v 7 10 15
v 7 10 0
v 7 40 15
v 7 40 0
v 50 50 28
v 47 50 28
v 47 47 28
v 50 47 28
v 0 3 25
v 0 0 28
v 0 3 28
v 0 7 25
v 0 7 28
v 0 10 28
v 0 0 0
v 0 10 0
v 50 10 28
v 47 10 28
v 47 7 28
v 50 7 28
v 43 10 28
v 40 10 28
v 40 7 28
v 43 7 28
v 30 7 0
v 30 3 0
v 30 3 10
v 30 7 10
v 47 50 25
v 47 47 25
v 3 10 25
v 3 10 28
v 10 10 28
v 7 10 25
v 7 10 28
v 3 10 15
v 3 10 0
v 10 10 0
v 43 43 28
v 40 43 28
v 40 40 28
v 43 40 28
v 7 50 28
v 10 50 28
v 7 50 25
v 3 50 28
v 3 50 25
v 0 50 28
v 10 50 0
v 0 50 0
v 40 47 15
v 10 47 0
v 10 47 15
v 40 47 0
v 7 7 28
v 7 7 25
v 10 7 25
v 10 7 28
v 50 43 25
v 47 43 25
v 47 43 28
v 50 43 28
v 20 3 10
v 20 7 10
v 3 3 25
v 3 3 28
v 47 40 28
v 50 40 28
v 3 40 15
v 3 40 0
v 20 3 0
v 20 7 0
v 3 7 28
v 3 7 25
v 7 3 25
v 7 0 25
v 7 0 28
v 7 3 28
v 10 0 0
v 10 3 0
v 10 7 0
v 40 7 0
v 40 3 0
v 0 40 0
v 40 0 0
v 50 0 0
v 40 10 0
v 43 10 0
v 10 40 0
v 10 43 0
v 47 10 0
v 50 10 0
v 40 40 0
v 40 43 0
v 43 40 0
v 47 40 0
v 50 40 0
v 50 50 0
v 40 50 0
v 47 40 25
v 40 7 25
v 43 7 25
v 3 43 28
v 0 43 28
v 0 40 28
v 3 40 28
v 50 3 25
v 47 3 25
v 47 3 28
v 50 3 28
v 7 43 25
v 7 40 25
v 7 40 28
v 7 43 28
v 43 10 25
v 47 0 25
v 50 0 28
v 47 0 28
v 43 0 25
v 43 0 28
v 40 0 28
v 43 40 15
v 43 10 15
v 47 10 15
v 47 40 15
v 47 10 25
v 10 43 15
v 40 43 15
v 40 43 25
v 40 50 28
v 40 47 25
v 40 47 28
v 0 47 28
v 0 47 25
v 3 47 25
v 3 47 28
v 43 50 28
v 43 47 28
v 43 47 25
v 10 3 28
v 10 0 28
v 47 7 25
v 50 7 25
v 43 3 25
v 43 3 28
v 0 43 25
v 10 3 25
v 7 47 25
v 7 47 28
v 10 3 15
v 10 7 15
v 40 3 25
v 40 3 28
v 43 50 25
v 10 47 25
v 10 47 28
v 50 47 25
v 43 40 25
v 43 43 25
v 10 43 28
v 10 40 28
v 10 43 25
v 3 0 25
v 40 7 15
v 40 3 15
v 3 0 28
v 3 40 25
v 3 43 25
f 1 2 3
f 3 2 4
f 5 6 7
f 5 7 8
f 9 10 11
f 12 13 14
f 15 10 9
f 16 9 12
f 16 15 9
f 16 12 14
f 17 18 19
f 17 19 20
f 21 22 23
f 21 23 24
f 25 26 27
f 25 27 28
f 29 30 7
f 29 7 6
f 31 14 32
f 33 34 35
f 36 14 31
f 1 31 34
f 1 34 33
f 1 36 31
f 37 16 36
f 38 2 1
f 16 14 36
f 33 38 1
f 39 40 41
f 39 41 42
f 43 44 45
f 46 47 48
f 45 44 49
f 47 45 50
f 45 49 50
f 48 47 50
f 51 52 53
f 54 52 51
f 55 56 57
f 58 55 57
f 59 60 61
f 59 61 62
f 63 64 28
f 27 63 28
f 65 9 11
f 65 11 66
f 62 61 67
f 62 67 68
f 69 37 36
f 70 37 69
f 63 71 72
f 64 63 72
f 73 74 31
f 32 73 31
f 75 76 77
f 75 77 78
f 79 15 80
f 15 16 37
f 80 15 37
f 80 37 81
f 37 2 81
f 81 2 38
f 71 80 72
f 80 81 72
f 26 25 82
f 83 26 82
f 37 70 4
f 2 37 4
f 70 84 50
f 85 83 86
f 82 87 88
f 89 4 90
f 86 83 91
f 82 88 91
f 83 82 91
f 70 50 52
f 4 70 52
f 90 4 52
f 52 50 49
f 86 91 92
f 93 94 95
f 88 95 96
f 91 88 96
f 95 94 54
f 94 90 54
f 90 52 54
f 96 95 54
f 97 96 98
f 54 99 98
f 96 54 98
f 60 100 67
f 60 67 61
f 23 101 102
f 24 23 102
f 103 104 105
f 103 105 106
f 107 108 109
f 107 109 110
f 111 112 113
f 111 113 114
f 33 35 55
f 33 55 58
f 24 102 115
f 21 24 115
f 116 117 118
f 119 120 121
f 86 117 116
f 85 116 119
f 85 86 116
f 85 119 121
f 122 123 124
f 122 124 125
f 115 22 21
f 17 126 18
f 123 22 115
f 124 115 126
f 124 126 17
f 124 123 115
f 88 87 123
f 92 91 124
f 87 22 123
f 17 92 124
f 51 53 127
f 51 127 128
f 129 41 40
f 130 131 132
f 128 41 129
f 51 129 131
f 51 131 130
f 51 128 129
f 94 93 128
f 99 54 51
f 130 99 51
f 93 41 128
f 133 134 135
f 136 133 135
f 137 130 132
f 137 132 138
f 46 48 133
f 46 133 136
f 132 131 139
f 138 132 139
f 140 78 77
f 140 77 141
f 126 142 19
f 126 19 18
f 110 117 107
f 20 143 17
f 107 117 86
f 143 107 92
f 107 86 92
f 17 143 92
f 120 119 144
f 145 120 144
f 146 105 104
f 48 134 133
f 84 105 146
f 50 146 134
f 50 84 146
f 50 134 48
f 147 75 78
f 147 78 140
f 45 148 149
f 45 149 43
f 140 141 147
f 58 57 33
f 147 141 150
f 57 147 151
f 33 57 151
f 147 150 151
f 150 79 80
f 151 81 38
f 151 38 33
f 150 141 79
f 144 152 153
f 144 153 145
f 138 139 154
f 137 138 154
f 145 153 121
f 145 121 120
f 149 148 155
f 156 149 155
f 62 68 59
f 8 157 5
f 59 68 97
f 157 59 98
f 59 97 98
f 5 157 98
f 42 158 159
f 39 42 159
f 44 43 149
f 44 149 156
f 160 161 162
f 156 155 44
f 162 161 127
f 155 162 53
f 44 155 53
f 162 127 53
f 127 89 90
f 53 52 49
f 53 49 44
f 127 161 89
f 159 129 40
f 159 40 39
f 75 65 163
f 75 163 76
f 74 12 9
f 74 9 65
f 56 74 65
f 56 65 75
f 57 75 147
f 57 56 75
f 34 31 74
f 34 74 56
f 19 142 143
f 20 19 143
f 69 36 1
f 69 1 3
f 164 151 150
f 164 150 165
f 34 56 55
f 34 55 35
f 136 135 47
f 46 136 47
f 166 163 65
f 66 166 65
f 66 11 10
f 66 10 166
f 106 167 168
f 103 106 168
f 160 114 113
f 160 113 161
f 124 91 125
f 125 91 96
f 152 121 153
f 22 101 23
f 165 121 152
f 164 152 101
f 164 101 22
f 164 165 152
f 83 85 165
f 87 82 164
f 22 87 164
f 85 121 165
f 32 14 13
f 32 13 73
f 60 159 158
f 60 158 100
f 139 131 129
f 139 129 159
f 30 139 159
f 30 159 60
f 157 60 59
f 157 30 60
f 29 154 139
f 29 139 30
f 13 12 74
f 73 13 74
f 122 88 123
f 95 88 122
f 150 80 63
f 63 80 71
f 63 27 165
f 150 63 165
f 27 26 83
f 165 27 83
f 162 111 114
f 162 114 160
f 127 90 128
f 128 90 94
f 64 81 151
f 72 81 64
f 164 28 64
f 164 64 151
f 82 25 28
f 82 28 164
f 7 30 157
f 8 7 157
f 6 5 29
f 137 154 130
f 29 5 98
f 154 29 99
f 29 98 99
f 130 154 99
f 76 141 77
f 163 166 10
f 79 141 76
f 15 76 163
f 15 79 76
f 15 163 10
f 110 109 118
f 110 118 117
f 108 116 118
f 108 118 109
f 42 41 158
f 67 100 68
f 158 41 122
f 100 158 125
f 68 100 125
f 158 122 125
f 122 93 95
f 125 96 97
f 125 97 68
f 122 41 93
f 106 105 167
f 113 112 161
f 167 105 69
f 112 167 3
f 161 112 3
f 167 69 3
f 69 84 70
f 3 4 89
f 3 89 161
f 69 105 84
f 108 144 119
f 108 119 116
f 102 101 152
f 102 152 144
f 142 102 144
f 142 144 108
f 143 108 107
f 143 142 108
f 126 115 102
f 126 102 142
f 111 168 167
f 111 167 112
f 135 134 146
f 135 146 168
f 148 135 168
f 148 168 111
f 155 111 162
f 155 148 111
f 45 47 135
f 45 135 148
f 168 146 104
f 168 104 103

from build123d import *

# Parameters (mm, degrees)
BOX002_W     = 3
BOX002_H     = 3
BOX002_DEPTH = 3
BOX003_W     = 3
BOX003_H     = 3
BOX003_DEPTH = 3
BOX004_W     = 3
BOX004_H     = 3
BOX004_DEPTH = 3
BOX005_W     = 3
BOX005_H     = 3
BOX005_DEPTH = 3
BOX001_W     = 10
BOX001_H     = 10
BOX001_DEPTH = 25
BOX012_W     = 3
BOX012_H     = 3
BOX012_DEPTH = 3
BOX013_W     = 3
BOX013_H     = 3
BOX013_DEPTH = 3
BOX014_W     = 3
BOX014_H     = 3
BOX014_DEPTH = 3
BOX015_W     = 3
BOX015_H     = 3
BOX015_DEPTH = 3
BOX011_W     = 10
BOX011_H     = 10
BOX011_DEPTH = 25
BOX017_W     = 3
BOX017_H     = 3
BOX017_DEPTH = 3
BOX018_W     = 3
BOX018_H     = 3
BOX018_DEPTH = 3
BOX019_W     = 3
BOX019_H     = 3
BOX019_DEPTH = 3
BOX020_W     = 3
BOX020_H     = 3
BOX020_DEPTH = 3
BOX016_W     = 10
BOX016_H     = 10
BOX016_DEPTH = 25
BOX021_W     = 50
BOX021_H     = 4
BOX021_DEPTH = 15
BOX022_W     = 50
BOX022_H     = 4
BOX022_DEPTH = 15
BOX023_W     = 50
BOX023_H     = 4
BOX023_DEPTH = 15
BOX024_W     = 10
BOX024_H     = 10
BOX024_DEPTH = 10
BOX_W        = 50
BOX_H        = 4
BOX_DEPTH    = 15
BOX007_W     = 3
BOX007_H     = 3
BOX007_DEPTH = 3
BOX008_W     = 3
BOX008_H     = 3
BOX008_DEPTH = 3
BOX009_W     = 3
BOX009_H     = 3
BOX009_DEPTH = 3
BOX010_W     = 3
BOX010_H     = 3
BOX010_DEPTH = 3
BOX006_W     = 10
BOX006_H     = 10
BOX006_DEPTH = 25


with BuildPart() as cubo001:
    # Box002 → Box002 (new body)
    with BuildSketch(Plane.XY.offset(25)):
        with Locations((1.5, 1.5)):
            Rectangle(BOX002_W, BOX002_H)
    extrude(amount=BOX002_DEPTH)


with BuildPart() as cubo002:
    # Box003 → Box003 (new body)
    with BuildSketch(Plane(origin=(7, 0, 25), x_dir=(1, 0, 0), z_dir=(0, 0, 1))):
        with Locations((1.5, 1.5)):
            Rectangle(BOX003_W, BOX003_H)
    extrude(amount=BOX003_DEPTH)


with BuildPart() as cubo003:
    # Box004 → Box004 (new body)
    with BuildSketch(Plane(origin=(7, 7, 25), x_dir=(1, 0, 0), z_dir=(0, 0, 1))):
        with Locations((1.5, 1.5)):
            Rectangle(BOX004_W, BOX004_H)
    extrude(amount=BOX004_DEPTH)


with BuildPart() as cubo004:
    # Box005 → Box005 (new body)
    with BuildSketch(Plane(origin=(0, 7, 25), x_dir=(1, 0, 0), z_dir=(0, 0, 1))):
        with Locations((1.5, 1.5)):
            Rectangle(BOX005_W, BOX005_H)
    extrude(amount=BOX005_DEPTH)


with BuildPart() as fusion:
    # Box001 → Box001 (new body)
    with BuildSketch(Plane.XY):
        with Locations((5, 5)):
            Rectangle(BOX001_W, BOX001_H)
    extrude(amount=BOX001_DEPTH)

    # Fusion: union Cubo001, Cubo002, Cubo003, Cubo004
    add(cubo001.part)
    add(cubo002.part)
    add(cubo003.part)
    add(cubo004.part)


with BuildPart() as cubo011:
    # Box012 → Box012 (new body)
    with BuildSketch(Plane.XY.offset(25)):
        with Locations((1.5, 1.5)):
            Rectangle(BOX012_W, BOX012_H)
    extrude(amount=BOX012_DEPTH)


with BuildPart() as cubo012:
    # Box013 → Box013 (new body)
    with BuildSketch(Plane(origin=(7, 0, 25), x_dir=(1, 0, 0), z_dir=(0, 0, 1))):
        with Locations((1.5, 1.5)):
            Rectangle(BOX013_W, BOX013_H)
    extrude(amount=BOX013_DEPTH)


with BuildPart() as cubo013:
    # Box014 → Box014 (new body)
    with BuildSketch(Plane(origin=(7, 7, 25), x_dir=(1, 0, 0), z_dir=(0, 0, 1))):
        with Locations((1.5, 1.5)):
            Rectangle(BOX014_W, BOX014_H)
    extrude(amount=BOX014_DEPTH)


with BuildPart() as cubo014:
    # Box015 → Box015 (new body)
    with BuildSketch(Plane(origin=(0, 7, 25), x_dir=(1, 0, 0), z_dir=(0, 0, 1))):
        with Locations((1.5, 1.5)):
            Rectangle(BOX015_W, BOX015_H)
    extrude(amount=BOX015_DEPTH)


with BuildPart() as fusion002:
    # Box011 → Box011 (new body)
    with BuildSketch(Plane.XY):
        with Locations((5, 5)):
            Rectangle(BOX011_W, BOX011_H)
    extrude(amount=BOX011_DEPTH)

    # Fusion002: union Cubo011, Cubo012, Cubo013, Cubo014
    add(cubo011.part)
    add(cubo012.part)
    add(cubo013.part)
    add(cubo014.part)


with BuildPart() as fusion002_1:
    # Fusion002 placement: moved
    add(fusion002.part.moved(Location((40, 40, 0))))


with BuildPart() as cubo016:
    # Box017 → Box017 (new body)
    with BuildSketch(Plane.XY.offset(25)):
        with Locations((1.5, 1.5)):
            Rectangle(BOX017_W, BOX017_H)
    extrude(amount=BOX017_DEPTH)


with BuildPart() as cubo017:
    # Box018 → Box018 (new body)
    with BuildSketch(Plane(origin=(7, 0, 25), x_dir=(1, 0, 0), z_dir=(0, 0, 1))):
        with Locations((1.5, 1.5)):
            Rectangle(BOX018_W, BOX018_H)
    extrude(amount=BOX018_DEPTH)


with BuildPart() as cubo018:
    # Box019 → Box019 (new body)
    with BuildSketch(Plane(origin=(7, 7, 25), x_dir=(1, 0, 0), z_dir=(0, 0, 1))):
        with Locations((1.5, 1.5)):
            Rectangle(BOX019_W, BOX019_H)
    extrude(amount=BOX019_DEPTH)


with BuildPart() as cubo019:
    # Box020 → Box020 (new body)
    with BuildSketch(Plane(origin=(0, 7, 25), x_dir=(1, 0, 0), z_dir=(0, 0, 1))):
        with Locations((1.5, 1.5)):
            Rectangle(BOX020_W, BOX020_H)
    extrude(amount=BOX020_DEPTH)


with BuildPart() as fusion003:
    # Box016 → Box016 (new body)
    with BuildSketch(Plane.XY):
        with Locations((5, 5)):
            Rectangle(BOX016_W, BOX016_H)
    extrude(amount=BOX016_DEPTH)

    # Fusion003: union Cubo016, Cubo017, Cubo018, Cubo019
    add(cubo016.part)
    add(cubo017.part)
    add(cubo018.part)
    add(cubo019.part)


with BuildPart() as fusion003_1:
    # Fusion003 placement: moved
    add(fusion003.part.moved(Location((0, 40, 0))))


with BuildPart() as wall001:
    # Box021 → Box021 (new body)
    with BuildSketch(Plane(origin=(0, 43, 0), x_dir=(1, 0, 0), z_dir=(0, 0, 1))):
        with Locations((25, 2)):
            Rectangle(BOX021_W, BOX021_H)
    extrude(amount=BOX021_DEPTH)


with BuildPart() as wall002:
    # Box022 → Box022 (new body)
    with BuildSketch(Plane(origin=(7, 0, 0), x_dir=(0, 1, 0), z_dir=(0, 0, 1))):
        with Locations((25, 2)):
            Rectangle(BOX022_W, BOX022_H)
    extrude(amount=BOX022_DEPTH)


with BuildPart() as wall003:
    # Box023 → Box023 (new body)
    with BuildSketch(Plane(origin=(47, 0, 0), x_dir=(0, 1, 0), z_dir=(0, 0, 1))):
        with Locations((25, 2)):
            Rectangle(BOX023_W, BOX023_H)
    extrude(amount=BOX023_DEPTH)


with BuildPart() as cubo020:
    # Box024 → Box024 (new body)
    with BuildSketch(Plane(origin=(20, 0, 0), x_dir=(1, 0, 0), z_dir=(0, 0, 1))):
        with Locations((5, 5)):
            Rectangle(BOX024_W, BOX024_H)
    extrude(amount=BOX024_DEPTH)


with BuildPart() as cut:
    # Box → Box (new body)
    with BuildSketch(Plane(origin=(0, 3, 0), x_dir=(1, 0, 0), z_dir=(0, 0, 1))):
        with Locations((25, 2)):
            Rectangle(BOX_W, BOX_H)
    extrude(amount=BOX_DEPTH)

    # Cut: cut Cubo020
    add(cubo020.part, mode=Mode.SUBTRACT)


with BuildPart() as cubo006:
    # Box007 → Box007 (new body)
    with BuildSketch(Plane.XY.offset(25)):
        with Locations((1.5, 1.5)):
            Rectangle(BOX007_W, BOX007_H)
    extrude(amount=BOX007_DEPTH)


with BuildPart() as cubo007:
    # Box008 → Box008 (new body)
    with BuildSketch(Plane(origin=(7, 0, 25), x_dir=(1, 0, 0), z_dir=(0, 0, 1))):
        with Locations((1.5, 1.5)):
            Rectangle(BOX008_W, BOX008_H)
    extrude(amount=BOX008_DEPTH)


with BuildPart() as cubo008:
    # Box009 → Box009 (new body)
    with BuildSketch(Plane(origin=(7, 7, 25), x_dir=(1, 0, 0), z_dir=(0, 0, 1))):
        with Locations((1.5, 1.5)):
            Rectangle(BOX009_W, BOX009_H)
    extrude(amount=BOX009_DEPTH)


with BuildPart() as cubo009:
    # Box010 → Box010 (new body)
    with BuildSketch(Plane(origin=(0, 7, 25), x_dir=(1, 0, 0), z_dir=(0, 0, 1))):
        with Locations((1.5, 1.5)):
            Rectangle(BOX010_W, BOX010_H)
    extrude(amount=BOX010_DEPTH)


with BuildPart() as fusion004:
    # Box006 → Box006 (new body)
    with BuildSketch(Plane.XY):
        with Locations((5, 5)):
            Rectangle(BOX006_W, BOX006_H)
    extrude(amount=BOX006_DEPTH)

    # Fusion001: union Cubo006, Cubo007, Cubo008, Cubo009
    add(cubo006.part)
    add(cubo007.part)
    add(cubo008.part)
    add(cubo009.part)


with BuildPart() as fusion004_1:
    # Fusion001 placement: moved
    add(fusion004.part.moved(Location((40, 0, 0))))

    # Fusion004: union Fusion, Fusion002, Fusion003, wall001, wall002, wall003, Cut
    add(fusion.part)
    add(fusion002_1.part)
    add(fusion003_1.part)
    add(wall001.part)
    add(wall002.part)
    add(wall003.part)
    add(cut.part)


solid = fusion004_1.part
